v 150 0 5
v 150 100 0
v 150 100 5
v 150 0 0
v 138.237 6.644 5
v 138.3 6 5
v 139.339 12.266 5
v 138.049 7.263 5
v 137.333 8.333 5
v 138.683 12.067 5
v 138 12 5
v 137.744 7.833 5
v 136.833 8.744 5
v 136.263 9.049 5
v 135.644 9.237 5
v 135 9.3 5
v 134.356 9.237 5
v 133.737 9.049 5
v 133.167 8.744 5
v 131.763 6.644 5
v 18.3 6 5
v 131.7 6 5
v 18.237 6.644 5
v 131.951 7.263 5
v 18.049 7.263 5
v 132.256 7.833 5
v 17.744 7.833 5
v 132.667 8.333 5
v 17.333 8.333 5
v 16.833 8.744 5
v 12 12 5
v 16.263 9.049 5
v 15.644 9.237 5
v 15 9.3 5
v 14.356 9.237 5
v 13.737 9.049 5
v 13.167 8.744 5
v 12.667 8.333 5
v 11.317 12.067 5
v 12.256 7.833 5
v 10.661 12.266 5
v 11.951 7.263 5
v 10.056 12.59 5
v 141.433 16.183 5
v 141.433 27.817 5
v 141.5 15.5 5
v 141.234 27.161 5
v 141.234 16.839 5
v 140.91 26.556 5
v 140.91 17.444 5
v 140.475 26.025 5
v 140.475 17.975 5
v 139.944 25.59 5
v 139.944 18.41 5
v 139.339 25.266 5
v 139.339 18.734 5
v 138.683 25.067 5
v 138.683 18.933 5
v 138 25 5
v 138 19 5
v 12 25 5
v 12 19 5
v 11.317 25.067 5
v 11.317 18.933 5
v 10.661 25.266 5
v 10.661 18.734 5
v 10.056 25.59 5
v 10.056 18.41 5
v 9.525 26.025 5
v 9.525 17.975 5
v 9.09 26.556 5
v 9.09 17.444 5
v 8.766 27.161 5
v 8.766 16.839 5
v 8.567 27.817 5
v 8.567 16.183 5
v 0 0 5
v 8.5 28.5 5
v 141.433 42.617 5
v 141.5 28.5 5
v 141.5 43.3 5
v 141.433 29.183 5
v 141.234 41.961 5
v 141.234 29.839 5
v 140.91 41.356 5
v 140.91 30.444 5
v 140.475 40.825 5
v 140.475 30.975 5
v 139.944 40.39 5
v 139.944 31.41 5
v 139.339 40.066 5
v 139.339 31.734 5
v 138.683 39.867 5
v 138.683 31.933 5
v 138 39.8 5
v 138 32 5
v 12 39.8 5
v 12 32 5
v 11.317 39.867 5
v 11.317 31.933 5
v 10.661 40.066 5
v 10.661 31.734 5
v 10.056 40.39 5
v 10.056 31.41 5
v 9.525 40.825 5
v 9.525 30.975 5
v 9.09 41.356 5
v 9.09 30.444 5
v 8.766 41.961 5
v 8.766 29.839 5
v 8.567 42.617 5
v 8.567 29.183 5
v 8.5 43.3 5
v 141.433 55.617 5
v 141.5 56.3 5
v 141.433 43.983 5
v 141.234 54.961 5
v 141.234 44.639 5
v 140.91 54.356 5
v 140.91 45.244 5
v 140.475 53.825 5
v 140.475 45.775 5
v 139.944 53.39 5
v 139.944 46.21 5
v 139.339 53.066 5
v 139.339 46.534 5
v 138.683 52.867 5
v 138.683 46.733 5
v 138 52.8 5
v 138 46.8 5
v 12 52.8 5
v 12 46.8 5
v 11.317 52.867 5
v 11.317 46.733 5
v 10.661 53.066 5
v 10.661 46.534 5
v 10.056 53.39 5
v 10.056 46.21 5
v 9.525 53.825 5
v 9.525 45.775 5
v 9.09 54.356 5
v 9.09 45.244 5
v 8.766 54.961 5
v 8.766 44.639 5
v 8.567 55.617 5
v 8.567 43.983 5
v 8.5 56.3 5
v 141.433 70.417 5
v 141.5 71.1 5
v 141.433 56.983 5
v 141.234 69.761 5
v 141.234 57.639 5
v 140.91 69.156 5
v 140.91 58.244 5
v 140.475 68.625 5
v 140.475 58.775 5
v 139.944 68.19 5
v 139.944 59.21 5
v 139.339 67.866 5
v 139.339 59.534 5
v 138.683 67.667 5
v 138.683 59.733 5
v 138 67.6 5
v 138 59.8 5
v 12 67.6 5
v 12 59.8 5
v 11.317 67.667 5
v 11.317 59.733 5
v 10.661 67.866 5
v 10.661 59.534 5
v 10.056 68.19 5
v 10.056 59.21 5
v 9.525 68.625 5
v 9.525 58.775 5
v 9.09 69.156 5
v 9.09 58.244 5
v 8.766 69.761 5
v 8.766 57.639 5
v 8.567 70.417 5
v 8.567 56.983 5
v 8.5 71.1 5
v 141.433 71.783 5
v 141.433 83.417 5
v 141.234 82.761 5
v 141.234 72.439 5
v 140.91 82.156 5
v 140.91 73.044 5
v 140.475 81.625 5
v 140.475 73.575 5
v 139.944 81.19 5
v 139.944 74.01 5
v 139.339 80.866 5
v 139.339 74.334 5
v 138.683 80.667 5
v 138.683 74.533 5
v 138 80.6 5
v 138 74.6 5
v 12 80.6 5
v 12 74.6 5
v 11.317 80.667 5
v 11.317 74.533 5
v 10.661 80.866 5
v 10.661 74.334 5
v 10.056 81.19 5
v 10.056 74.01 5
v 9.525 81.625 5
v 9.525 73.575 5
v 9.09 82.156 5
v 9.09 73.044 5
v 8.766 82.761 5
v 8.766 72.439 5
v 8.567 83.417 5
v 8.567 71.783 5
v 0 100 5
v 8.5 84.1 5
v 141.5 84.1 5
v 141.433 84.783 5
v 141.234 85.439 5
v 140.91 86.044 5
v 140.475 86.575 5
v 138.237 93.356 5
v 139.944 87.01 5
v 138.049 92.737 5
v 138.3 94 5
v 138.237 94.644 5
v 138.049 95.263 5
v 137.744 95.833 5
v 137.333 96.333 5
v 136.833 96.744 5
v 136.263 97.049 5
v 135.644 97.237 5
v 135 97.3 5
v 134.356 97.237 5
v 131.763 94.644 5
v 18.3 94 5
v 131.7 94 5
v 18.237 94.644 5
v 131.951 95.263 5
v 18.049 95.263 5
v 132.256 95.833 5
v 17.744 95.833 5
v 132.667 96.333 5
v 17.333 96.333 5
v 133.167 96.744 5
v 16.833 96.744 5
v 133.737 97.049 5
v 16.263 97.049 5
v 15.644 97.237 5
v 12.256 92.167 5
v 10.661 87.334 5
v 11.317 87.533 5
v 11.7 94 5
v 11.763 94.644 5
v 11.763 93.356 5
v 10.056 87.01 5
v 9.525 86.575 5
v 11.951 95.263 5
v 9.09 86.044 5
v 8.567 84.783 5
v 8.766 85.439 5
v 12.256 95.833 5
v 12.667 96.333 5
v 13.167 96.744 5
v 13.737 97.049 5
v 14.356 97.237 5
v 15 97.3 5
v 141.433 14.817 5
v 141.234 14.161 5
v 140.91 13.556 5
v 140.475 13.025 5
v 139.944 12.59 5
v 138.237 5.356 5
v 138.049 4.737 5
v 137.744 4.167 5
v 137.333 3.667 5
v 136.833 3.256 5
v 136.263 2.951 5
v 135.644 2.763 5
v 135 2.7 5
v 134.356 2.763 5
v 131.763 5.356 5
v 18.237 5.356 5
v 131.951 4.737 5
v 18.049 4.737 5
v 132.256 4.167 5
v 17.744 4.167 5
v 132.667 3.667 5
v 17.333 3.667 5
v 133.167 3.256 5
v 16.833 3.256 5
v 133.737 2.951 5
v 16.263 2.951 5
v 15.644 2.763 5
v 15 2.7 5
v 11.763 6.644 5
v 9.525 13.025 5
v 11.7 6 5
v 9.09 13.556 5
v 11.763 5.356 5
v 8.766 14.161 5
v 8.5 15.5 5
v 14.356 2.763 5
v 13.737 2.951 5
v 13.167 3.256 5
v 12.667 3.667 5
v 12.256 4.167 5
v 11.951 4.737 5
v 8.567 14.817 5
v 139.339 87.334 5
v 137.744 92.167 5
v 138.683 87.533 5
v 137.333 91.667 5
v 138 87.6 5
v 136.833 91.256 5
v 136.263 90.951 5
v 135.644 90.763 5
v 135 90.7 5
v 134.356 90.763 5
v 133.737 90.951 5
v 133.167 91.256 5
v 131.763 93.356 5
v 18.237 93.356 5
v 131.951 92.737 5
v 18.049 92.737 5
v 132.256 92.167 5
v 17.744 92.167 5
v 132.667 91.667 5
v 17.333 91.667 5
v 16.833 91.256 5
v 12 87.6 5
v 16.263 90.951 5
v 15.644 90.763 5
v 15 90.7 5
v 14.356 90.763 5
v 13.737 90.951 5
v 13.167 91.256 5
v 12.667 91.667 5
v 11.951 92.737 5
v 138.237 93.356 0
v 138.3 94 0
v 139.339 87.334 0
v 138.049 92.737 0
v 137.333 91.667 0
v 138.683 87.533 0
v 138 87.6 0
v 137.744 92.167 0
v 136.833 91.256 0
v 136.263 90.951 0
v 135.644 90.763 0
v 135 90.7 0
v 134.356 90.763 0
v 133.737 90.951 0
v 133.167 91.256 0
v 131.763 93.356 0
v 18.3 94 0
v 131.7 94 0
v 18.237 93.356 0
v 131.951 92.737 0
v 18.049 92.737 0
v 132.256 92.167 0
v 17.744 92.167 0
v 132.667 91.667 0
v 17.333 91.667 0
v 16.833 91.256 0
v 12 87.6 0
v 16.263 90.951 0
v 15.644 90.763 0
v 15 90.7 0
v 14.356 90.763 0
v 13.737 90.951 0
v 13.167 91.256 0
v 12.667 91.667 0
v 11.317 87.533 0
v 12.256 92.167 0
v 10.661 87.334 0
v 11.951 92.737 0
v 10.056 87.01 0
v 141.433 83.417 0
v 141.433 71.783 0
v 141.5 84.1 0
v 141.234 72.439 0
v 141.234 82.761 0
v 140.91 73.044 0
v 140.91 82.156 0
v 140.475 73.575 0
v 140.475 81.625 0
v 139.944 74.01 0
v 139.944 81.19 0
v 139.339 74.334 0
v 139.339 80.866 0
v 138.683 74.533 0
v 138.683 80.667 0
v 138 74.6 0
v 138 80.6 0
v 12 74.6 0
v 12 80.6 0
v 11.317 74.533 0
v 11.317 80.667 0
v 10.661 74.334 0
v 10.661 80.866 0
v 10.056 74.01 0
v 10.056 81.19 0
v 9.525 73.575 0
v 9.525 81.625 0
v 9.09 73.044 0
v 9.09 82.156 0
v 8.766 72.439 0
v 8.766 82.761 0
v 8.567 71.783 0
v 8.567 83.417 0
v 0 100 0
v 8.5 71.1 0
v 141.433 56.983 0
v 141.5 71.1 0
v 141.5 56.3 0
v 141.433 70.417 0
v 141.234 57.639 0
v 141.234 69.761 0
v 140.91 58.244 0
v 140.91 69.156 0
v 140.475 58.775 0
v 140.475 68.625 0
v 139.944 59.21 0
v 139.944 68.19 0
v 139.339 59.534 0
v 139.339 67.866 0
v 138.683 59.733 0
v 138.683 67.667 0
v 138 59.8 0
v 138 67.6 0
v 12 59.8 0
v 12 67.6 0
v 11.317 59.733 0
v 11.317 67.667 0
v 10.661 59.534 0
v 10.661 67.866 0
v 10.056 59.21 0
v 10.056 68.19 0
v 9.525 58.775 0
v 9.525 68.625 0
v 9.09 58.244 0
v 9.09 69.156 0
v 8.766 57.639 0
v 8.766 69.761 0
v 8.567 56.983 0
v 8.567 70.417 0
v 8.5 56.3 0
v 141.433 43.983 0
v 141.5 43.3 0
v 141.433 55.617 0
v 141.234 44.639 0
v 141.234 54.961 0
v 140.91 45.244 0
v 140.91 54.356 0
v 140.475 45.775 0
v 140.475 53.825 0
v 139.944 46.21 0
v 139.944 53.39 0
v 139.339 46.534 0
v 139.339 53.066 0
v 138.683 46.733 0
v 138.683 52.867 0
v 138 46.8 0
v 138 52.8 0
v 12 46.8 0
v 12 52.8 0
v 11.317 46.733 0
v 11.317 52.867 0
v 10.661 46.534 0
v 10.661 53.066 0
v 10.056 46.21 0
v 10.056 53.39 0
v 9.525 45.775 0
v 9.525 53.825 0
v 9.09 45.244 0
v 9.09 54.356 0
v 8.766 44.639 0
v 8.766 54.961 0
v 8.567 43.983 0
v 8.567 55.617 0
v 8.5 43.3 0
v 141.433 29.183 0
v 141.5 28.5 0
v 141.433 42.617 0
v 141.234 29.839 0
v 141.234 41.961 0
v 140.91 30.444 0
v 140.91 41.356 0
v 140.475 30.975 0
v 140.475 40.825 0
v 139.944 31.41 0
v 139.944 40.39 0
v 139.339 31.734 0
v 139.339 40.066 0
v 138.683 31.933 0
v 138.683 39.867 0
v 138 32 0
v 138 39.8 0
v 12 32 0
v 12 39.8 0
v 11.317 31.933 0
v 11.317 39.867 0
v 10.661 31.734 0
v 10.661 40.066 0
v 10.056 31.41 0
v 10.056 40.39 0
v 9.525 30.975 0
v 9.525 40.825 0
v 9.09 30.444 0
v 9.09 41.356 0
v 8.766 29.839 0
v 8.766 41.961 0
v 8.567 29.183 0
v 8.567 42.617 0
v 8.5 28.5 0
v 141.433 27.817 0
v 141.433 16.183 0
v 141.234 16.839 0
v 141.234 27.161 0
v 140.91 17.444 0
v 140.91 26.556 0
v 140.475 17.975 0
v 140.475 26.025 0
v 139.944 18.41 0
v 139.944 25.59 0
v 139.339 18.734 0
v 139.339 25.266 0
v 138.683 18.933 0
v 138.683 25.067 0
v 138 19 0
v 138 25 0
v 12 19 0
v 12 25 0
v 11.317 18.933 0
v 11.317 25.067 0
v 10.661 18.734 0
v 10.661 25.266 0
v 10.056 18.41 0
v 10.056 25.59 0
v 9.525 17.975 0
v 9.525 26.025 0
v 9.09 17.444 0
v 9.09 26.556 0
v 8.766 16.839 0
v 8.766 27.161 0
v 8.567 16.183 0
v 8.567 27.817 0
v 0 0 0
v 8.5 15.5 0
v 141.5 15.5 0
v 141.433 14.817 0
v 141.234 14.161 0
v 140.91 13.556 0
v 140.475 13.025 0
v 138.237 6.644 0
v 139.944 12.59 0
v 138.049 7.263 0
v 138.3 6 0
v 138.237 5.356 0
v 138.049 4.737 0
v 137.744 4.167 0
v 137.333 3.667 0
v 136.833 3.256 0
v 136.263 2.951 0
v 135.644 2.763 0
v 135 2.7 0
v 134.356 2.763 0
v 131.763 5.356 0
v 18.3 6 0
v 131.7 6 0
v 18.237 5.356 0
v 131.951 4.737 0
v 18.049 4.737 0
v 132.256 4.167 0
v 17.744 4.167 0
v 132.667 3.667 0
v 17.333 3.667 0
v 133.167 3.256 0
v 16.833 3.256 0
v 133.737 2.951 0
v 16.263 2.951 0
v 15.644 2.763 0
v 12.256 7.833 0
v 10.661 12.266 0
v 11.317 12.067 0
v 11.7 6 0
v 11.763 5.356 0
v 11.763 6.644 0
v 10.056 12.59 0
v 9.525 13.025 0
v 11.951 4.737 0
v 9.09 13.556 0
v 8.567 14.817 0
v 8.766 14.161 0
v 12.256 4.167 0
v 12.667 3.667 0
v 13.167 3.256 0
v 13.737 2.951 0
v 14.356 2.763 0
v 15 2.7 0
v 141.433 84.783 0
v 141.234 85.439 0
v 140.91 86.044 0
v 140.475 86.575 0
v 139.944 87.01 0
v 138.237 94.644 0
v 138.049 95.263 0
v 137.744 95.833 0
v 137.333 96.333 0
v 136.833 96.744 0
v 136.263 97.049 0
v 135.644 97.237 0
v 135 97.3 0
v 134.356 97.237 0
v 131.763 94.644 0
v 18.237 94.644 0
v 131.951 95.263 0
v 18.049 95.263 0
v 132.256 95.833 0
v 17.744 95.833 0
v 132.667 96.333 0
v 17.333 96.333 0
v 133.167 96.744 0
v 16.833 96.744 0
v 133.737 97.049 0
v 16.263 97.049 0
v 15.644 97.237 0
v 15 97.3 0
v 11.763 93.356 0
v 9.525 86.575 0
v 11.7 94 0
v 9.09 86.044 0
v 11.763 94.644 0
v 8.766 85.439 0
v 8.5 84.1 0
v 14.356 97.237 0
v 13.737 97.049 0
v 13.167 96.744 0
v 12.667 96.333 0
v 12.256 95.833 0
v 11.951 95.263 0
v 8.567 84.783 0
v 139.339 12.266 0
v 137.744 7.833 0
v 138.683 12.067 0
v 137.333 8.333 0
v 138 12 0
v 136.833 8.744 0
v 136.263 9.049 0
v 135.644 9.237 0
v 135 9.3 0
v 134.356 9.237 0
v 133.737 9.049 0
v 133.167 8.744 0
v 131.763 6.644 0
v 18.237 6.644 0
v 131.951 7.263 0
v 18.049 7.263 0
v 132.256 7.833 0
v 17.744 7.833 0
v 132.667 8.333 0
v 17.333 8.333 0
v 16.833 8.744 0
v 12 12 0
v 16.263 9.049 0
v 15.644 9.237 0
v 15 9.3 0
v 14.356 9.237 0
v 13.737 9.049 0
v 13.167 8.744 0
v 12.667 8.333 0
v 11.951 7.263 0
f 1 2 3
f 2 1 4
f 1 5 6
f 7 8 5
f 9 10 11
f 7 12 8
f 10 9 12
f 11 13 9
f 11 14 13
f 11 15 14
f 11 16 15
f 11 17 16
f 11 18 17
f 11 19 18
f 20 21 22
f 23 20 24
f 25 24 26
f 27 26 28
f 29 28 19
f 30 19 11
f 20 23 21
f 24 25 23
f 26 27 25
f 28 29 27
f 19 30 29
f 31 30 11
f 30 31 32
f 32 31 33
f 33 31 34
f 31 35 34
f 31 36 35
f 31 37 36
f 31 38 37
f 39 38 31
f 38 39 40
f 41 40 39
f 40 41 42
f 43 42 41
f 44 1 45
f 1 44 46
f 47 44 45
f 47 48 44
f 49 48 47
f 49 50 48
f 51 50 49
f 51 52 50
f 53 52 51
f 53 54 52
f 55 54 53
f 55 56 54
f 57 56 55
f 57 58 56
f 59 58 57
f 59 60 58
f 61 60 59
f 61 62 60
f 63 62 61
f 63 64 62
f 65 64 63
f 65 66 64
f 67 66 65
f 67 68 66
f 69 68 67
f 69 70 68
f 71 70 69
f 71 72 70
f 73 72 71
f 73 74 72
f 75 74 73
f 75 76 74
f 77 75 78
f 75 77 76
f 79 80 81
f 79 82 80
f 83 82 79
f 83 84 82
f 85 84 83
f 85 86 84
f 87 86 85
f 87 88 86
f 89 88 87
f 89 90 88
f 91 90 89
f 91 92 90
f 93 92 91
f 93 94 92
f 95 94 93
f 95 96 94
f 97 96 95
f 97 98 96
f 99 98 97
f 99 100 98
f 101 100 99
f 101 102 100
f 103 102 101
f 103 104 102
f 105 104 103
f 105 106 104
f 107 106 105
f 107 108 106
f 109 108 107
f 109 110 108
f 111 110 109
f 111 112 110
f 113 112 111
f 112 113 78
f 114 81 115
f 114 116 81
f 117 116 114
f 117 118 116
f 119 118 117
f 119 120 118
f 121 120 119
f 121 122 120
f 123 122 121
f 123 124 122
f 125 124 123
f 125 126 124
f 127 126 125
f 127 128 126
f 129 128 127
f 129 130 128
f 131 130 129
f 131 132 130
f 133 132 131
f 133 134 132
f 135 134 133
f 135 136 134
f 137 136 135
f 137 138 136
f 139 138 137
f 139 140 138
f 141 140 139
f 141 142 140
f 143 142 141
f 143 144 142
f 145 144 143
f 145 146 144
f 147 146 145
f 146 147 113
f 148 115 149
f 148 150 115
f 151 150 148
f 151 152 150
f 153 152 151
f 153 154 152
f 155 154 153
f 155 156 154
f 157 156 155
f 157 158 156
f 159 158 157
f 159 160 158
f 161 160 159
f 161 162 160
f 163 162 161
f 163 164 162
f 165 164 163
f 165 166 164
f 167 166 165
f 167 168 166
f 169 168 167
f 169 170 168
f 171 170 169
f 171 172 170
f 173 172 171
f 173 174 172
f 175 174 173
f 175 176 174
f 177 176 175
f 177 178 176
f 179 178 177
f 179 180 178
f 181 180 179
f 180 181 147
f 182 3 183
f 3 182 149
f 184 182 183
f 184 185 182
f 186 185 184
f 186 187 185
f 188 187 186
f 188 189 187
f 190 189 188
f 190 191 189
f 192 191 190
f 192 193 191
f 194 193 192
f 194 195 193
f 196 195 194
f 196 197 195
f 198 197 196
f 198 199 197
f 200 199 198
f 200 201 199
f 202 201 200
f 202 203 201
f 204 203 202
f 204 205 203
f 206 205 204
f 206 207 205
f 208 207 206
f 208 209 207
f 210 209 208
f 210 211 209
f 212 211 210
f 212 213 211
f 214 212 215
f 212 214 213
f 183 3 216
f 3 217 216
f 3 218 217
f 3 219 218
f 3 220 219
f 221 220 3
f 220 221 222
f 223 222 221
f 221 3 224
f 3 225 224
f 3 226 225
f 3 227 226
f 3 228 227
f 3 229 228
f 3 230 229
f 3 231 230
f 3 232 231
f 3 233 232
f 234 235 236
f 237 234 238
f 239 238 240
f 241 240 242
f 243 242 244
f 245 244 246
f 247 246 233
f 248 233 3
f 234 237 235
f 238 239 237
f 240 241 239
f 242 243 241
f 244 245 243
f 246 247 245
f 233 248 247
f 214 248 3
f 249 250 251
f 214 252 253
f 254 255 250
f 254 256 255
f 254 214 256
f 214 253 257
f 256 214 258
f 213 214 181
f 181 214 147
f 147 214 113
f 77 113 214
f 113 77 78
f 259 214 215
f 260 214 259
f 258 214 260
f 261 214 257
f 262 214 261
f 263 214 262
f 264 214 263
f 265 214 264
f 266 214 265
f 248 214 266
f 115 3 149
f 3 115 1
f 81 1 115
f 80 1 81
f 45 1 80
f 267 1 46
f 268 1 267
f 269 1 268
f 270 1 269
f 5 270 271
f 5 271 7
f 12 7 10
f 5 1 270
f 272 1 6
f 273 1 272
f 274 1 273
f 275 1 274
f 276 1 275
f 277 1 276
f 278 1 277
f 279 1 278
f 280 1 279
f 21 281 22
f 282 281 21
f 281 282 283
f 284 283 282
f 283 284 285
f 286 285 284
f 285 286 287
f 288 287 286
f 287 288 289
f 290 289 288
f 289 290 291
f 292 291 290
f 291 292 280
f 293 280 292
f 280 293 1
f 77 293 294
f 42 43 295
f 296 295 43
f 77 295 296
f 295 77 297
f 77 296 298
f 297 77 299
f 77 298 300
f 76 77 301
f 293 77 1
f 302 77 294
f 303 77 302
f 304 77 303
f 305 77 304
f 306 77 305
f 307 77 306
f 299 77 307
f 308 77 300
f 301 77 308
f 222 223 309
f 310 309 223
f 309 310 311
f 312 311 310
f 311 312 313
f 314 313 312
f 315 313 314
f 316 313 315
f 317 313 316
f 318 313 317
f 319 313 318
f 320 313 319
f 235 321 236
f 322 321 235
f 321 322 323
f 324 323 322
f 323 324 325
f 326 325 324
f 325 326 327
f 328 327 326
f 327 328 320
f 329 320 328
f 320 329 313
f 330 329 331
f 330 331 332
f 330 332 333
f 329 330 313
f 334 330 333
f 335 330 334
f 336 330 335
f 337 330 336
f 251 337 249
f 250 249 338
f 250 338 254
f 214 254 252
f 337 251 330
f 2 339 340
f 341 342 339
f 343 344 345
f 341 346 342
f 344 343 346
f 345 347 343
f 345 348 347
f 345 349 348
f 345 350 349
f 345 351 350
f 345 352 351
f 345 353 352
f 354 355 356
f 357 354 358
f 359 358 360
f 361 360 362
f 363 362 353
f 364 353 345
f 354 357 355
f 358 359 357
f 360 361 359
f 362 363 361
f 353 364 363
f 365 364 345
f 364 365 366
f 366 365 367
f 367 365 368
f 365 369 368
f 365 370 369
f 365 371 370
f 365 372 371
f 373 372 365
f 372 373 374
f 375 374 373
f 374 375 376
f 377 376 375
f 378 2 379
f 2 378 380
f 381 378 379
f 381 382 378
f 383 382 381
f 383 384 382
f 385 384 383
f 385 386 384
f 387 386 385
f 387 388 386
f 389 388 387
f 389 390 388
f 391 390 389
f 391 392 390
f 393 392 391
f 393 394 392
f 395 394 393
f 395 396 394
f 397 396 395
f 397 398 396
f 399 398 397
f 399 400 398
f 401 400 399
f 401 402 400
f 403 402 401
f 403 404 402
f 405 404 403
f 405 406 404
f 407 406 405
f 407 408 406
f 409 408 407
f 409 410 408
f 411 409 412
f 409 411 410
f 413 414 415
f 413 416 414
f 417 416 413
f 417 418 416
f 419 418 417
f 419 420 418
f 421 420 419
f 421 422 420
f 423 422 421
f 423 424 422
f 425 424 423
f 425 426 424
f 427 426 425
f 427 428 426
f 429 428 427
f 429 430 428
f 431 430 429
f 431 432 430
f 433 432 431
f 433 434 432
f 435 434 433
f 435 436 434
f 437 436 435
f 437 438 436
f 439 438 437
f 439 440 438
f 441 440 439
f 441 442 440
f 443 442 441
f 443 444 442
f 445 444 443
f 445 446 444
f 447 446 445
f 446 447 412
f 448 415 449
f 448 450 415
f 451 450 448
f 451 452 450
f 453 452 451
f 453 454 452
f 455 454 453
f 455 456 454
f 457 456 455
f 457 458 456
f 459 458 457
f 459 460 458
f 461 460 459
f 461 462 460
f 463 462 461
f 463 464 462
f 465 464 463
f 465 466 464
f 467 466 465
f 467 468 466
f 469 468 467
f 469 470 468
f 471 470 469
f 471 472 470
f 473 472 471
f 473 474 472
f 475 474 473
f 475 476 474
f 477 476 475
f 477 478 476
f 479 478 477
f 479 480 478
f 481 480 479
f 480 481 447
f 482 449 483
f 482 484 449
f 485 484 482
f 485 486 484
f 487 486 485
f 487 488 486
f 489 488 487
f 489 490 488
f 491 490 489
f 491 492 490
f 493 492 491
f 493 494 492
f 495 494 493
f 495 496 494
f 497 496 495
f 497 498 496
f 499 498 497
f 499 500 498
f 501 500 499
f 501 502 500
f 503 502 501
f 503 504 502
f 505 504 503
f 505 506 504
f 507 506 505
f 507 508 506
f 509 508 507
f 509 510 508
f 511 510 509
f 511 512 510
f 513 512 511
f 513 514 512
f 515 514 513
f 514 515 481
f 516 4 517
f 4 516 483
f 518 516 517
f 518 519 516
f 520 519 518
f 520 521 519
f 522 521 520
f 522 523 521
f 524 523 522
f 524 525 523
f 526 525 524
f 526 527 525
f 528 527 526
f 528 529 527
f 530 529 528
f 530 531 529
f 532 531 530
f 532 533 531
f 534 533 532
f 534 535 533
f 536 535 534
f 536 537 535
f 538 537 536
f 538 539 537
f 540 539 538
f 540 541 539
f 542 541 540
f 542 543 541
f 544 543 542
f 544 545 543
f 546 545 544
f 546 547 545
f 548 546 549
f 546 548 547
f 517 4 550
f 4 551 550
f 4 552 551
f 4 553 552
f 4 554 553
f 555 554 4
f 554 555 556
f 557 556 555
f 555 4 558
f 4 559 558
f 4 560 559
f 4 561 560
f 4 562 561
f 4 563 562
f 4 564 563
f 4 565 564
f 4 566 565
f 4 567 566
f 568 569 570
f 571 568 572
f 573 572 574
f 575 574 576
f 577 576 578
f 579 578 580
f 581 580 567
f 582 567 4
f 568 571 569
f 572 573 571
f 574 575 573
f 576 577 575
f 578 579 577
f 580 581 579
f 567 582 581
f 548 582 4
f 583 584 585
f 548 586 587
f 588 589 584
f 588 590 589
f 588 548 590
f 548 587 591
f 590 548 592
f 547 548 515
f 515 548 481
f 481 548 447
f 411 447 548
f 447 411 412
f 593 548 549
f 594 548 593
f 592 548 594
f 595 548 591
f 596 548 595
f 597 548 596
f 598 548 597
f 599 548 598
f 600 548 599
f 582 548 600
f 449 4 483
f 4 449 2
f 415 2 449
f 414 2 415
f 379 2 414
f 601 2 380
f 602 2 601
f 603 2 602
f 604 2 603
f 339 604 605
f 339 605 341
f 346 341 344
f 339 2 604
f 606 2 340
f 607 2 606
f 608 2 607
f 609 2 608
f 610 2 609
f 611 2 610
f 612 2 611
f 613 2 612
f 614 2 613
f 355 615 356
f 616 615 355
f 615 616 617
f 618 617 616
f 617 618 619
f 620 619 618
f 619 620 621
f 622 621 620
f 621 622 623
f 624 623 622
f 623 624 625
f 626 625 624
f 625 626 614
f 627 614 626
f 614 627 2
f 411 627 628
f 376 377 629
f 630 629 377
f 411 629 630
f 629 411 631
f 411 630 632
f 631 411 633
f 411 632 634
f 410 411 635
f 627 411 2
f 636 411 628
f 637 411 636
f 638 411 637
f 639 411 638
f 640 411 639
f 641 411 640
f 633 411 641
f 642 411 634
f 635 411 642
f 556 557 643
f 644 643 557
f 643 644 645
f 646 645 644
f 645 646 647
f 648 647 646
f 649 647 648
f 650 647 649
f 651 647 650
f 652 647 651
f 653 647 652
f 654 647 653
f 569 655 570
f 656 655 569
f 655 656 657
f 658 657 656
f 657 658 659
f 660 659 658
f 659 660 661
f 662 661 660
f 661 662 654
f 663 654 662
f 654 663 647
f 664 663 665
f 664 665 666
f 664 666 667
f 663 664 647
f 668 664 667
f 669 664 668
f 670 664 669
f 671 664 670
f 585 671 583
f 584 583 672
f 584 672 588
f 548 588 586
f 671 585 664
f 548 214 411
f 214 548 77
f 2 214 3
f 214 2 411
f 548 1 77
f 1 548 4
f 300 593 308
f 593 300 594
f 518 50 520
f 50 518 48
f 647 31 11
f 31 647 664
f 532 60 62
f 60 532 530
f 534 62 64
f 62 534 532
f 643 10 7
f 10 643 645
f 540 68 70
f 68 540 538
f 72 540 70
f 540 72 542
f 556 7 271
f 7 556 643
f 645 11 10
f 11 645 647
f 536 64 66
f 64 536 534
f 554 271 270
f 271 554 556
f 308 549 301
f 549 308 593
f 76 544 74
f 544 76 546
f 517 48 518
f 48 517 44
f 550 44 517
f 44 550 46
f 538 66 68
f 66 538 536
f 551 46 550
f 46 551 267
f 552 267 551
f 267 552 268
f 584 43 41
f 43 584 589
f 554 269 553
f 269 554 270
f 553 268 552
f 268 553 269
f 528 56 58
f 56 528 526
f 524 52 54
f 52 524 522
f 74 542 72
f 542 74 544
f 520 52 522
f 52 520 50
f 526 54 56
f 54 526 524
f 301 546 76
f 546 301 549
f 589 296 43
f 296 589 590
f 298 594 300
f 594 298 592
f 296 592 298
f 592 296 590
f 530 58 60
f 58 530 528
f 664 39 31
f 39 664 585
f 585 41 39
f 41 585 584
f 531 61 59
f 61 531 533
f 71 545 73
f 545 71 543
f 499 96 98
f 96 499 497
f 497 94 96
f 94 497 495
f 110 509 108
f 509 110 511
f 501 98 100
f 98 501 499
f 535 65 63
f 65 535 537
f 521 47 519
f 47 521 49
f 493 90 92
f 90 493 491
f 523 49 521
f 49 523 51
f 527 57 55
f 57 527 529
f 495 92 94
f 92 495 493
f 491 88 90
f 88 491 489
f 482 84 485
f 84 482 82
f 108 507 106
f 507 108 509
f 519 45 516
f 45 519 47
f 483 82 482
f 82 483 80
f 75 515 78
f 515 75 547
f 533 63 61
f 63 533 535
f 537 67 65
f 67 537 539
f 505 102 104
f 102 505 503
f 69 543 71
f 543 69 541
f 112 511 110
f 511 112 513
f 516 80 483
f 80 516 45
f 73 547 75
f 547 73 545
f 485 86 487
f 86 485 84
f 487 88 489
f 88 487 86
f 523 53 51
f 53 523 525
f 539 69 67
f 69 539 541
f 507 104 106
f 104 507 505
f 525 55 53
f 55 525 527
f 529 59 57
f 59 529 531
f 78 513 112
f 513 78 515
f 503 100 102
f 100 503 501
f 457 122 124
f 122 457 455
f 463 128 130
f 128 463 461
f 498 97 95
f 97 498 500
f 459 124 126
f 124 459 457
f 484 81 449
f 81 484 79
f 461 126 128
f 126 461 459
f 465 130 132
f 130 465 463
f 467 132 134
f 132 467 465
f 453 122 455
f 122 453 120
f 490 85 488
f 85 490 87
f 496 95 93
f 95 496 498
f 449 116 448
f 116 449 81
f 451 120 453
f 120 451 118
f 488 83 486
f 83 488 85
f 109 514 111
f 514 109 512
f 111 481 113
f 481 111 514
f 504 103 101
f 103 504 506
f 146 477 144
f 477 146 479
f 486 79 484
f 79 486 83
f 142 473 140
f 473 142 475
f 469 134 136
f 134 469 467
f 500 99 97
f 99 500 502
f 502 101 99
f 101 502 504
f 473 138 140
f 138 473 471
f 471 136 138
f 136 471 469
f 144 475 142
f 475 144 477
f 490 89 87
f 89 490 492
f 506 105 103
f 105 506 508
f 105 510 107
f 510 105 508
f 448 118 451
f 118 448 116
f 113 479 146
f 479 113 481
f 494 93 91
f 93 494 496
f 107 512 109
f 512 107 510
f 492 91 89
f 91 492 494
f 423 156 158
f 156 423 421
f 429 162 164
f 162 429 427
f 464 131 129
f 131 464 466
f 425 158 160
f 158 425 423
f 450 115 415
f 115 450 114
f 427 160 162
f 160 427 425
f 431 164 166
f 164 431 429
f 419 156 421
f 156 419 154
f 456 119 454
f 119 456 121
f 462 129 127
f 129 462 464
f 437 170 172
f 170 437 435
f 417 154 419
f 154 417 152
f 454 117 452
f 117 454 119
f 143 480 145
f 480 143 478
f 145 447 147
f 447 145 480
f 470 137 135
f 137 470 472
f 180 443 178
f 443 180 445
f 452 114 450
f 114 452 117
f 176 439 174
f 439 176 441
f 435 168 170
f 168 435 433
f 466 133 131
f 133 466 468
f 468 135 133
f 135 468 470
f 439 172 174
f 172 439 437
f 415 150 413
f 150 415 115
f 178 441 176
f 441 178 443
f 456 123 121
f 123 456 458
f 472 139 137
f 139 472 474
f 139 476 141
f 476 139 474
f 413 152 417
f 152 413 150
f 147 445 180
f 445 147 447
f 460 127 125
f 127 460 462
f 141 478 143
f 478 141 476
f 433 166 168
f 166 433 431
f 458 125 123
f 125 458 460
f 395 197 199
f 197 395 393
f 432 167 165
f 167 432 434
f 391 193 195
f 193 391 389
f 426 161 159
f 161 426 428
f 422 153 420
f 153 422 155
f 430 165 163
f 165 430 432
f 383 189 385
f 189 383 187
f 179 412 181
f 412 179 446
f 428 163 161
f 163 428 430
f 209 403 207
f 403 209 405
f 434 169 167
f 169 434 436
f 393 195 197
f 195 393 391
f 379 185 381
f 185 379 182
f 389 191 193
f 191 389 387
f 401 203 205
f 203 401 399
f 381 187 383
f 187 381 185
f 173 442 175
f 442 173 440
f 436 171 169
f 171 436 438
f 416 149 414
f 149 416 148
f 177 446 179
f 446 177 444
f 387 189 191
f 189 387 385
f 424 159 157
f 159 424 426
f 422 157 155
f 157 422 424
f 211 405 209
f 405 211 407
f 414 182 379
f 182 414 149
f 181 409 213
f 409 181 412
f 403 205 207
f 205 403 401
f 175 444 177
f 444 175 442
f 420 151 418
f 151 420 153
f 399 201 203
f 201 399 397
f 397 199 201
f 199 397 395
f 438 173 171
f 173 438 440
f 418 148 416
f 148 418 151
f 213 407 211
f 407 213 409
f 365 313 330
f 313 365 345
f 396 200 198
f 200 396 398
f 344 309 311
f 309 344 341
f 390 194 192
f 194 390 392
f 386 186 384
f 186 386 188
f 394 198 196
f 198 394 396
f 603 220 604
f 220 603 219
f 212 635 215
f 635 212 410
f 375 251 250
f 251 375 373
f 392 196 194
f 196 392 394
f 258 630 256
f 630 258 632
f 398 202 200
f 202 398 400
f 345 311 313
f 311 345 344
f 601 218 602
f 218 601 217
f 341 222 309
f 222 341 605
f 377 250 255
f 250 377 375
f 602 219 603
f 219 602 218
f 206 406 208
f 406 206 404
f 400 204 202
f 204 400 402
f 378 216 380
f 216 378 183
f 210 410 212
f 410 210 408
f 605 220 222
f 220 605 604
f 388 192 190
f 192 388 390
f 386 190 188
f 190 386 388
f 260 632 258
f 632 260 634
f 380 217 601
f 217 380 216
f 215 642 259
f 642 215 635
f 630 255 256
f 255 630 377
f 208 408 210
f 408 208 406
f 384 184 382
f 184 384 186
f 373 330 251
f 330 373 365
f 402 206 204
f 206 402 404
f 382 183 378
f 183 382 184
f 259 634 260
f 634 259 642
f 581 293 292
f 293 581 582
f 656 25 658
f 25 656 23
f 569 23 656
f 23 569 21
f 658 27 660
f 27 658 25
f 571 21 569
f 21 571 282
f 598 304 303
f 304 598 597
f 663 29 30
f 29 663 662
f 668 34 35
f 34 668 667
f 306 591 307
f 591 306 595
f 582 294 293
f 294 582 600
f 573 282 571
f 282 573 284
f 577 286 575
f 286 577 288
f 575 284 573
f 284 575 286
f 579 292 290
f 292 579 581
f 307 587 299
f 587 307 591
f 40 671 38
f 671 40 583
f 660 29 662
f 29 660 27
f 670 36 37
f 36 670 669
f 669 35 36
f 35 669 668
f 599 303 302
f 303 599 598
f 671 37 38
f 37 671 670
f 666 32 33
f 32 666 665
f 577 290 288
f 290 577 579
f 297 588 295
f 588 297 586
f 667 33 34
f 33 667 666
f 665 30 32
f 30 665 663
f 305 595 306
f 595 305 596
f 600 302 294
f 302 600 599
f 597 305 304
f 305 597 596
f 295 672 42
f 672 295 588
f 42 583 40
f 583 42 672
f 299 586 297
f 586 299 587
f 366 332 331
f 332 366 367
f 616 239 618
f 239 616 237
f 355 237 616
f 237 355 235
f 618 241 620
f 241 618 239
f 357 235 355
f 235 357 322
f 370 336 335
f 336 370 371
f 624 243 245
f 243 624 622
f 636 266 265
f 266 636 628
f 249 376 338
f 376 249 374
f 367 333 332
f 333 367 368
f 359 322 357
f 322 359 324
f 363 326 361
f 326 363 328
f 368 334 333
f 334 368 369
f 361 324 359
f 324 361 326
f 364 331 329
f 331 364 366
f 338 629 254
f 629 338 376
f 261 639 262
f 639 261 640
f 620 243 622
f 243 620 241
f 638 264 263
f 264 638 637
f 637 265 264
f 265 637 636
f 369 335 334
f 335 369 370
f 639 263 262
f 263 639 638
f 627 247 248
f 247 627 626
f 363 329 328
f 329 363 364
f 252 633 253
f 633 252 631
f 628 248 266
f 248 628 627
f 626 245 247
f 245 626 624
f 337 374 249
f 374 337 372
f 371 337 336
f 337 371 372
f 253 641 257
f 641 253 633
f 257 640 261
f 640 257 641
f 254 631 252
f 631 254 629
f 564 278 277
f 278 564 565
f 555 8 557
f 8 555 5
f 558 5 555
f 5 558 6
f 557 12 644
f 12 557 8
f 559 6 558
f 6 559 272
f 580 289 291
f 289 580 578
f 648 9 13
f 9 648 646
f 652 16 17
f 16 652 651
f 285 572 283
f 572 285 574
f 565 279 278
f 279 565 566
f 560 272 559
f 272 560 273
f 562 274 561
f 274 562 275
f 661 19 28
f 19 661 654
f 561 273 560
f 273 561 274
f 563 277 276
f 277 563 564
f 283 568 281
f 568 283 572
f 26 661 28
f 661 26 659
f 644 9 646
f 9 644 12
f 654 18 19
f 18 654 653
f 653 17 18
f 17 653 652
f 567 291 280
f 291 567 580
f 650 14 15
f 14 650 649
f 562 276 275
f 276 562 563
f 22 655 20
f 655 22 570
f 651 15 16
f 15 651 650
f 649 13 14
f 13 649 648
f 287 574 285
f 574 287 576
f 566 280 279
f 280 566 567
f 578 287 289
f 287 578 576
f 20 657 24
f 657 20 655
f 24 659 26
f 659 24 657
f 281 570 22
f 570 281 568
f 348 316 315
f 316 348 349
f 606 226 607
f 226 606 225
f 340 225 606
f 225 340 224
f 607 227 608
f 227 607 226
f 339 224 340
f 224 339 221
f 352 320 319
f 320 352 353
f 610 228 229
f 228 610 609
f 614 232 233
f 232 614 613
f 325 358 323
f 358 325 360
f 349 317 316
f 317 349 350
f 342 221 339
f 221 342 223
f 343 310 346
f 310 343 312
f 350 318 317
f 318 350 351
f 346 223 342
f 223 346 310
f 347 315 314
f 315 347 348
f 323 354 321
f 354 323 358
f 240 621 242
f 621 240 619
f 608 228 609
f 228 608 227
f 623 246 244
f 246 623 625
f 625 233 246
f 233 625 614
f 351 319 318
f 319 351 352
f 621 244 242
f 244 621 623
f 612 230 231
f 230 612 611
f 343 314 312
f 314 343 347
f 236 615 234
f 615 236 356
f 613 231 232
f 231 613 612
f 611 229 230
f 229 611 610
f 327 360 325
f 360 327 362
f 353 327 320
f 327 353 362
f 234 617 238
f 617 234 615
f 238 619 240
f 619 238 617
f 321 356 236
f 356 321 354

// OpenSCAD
$fn = 32;

// ----------------------------------------------------------------------
// Slotted panel: 150 x 100 mm, 6 рядов of slots
// ----------------------------------------------------------------------

// --- parameters (mm) ---
panel_w = 150;            // panel width
panel_d = 100;            // panel depth
thick = 5;                // panel thickness
slot_w = 7;               // slot width
pitch0 = 13;              // first row pitch
pitch_step = 1.8;         // pitch increase per row
margin = 12;              // margin around the slot field
rows = 6;                 // number of slot rows
mount_d = 6.6;            // mounting holes
mount_x = 60;             // mounting hole offset

difference() {
  union() {
    cube([panel_w, panel_d, thick]);
  }
  /* slot rows: stadium shaped cutters, 2.5 mm clear of both faces */
  /* row 0: pitch 13, length 126 */
  hull() {
    translate([12, 15.5, -2.5]) cylinder(h = thick + 5, d = slot_w);
    translate([138, 15.5, -2.5]) cylinder(h = thick + 5, d = slot_w);
  }
  /* row 1: pitch 14.8, length 126 */
  hull() {
    translate([12, 28.5, -2.5]) cylinder(h = thick + 5, d = slot_w);
    translate([138, 28.5, -2.5]) cylinder(h = thick + 5, d = slot_w);
  }
  /* row 2: pitch 13, length 126 */
  hull() {
    translate([12, 43.3, -2.5]) cylinder(h = thick + 5, d = slot_w);
    translate([138, 43.3, -2.5]) cylinder(h = thick + 5, d = slot_w);
  }
  /* row 3: pitch 14.8, length 126 */
  hull() {
    translate([12, 56.3, -2.5]) cylinder(h = thick + 5, d = slot_w);
    translate([138, 56.3, -2.5]) cylinder(h = thick + 5, d = slot_w);
  }
  /* row 4: pitch 13, length 126 */
  hull() {
    translate([12, 71.1, -2.5]) cylinder(h = thick + 5, d = slot_w);
    translate([138, 71.1, -2.5]) cylinder(h = thick + 5, d = slot_w);
  }
  /* row 5: pitch 14.8, length 126 */
  hull() {
    translate([12, 84.1, -2.5]) cylinder(h = thick + 5, d = slot_w);
    translate([138, 84.1, -2.5]) cylinder(h = thick + 5, d = slot_w);
  }
  translate([15, 6, -2.5]) cylinder(h = 10, d = mount_d);
  translate([15, 94, -2.5]) cylinder(h = 10, d = mount_d);
  translate([135, 6, -2.5]) cylinder(h = 10, d = mount_d);
  translate([135, 94, -2.5]) cylinder(h = 10, d = mount_d);
}
